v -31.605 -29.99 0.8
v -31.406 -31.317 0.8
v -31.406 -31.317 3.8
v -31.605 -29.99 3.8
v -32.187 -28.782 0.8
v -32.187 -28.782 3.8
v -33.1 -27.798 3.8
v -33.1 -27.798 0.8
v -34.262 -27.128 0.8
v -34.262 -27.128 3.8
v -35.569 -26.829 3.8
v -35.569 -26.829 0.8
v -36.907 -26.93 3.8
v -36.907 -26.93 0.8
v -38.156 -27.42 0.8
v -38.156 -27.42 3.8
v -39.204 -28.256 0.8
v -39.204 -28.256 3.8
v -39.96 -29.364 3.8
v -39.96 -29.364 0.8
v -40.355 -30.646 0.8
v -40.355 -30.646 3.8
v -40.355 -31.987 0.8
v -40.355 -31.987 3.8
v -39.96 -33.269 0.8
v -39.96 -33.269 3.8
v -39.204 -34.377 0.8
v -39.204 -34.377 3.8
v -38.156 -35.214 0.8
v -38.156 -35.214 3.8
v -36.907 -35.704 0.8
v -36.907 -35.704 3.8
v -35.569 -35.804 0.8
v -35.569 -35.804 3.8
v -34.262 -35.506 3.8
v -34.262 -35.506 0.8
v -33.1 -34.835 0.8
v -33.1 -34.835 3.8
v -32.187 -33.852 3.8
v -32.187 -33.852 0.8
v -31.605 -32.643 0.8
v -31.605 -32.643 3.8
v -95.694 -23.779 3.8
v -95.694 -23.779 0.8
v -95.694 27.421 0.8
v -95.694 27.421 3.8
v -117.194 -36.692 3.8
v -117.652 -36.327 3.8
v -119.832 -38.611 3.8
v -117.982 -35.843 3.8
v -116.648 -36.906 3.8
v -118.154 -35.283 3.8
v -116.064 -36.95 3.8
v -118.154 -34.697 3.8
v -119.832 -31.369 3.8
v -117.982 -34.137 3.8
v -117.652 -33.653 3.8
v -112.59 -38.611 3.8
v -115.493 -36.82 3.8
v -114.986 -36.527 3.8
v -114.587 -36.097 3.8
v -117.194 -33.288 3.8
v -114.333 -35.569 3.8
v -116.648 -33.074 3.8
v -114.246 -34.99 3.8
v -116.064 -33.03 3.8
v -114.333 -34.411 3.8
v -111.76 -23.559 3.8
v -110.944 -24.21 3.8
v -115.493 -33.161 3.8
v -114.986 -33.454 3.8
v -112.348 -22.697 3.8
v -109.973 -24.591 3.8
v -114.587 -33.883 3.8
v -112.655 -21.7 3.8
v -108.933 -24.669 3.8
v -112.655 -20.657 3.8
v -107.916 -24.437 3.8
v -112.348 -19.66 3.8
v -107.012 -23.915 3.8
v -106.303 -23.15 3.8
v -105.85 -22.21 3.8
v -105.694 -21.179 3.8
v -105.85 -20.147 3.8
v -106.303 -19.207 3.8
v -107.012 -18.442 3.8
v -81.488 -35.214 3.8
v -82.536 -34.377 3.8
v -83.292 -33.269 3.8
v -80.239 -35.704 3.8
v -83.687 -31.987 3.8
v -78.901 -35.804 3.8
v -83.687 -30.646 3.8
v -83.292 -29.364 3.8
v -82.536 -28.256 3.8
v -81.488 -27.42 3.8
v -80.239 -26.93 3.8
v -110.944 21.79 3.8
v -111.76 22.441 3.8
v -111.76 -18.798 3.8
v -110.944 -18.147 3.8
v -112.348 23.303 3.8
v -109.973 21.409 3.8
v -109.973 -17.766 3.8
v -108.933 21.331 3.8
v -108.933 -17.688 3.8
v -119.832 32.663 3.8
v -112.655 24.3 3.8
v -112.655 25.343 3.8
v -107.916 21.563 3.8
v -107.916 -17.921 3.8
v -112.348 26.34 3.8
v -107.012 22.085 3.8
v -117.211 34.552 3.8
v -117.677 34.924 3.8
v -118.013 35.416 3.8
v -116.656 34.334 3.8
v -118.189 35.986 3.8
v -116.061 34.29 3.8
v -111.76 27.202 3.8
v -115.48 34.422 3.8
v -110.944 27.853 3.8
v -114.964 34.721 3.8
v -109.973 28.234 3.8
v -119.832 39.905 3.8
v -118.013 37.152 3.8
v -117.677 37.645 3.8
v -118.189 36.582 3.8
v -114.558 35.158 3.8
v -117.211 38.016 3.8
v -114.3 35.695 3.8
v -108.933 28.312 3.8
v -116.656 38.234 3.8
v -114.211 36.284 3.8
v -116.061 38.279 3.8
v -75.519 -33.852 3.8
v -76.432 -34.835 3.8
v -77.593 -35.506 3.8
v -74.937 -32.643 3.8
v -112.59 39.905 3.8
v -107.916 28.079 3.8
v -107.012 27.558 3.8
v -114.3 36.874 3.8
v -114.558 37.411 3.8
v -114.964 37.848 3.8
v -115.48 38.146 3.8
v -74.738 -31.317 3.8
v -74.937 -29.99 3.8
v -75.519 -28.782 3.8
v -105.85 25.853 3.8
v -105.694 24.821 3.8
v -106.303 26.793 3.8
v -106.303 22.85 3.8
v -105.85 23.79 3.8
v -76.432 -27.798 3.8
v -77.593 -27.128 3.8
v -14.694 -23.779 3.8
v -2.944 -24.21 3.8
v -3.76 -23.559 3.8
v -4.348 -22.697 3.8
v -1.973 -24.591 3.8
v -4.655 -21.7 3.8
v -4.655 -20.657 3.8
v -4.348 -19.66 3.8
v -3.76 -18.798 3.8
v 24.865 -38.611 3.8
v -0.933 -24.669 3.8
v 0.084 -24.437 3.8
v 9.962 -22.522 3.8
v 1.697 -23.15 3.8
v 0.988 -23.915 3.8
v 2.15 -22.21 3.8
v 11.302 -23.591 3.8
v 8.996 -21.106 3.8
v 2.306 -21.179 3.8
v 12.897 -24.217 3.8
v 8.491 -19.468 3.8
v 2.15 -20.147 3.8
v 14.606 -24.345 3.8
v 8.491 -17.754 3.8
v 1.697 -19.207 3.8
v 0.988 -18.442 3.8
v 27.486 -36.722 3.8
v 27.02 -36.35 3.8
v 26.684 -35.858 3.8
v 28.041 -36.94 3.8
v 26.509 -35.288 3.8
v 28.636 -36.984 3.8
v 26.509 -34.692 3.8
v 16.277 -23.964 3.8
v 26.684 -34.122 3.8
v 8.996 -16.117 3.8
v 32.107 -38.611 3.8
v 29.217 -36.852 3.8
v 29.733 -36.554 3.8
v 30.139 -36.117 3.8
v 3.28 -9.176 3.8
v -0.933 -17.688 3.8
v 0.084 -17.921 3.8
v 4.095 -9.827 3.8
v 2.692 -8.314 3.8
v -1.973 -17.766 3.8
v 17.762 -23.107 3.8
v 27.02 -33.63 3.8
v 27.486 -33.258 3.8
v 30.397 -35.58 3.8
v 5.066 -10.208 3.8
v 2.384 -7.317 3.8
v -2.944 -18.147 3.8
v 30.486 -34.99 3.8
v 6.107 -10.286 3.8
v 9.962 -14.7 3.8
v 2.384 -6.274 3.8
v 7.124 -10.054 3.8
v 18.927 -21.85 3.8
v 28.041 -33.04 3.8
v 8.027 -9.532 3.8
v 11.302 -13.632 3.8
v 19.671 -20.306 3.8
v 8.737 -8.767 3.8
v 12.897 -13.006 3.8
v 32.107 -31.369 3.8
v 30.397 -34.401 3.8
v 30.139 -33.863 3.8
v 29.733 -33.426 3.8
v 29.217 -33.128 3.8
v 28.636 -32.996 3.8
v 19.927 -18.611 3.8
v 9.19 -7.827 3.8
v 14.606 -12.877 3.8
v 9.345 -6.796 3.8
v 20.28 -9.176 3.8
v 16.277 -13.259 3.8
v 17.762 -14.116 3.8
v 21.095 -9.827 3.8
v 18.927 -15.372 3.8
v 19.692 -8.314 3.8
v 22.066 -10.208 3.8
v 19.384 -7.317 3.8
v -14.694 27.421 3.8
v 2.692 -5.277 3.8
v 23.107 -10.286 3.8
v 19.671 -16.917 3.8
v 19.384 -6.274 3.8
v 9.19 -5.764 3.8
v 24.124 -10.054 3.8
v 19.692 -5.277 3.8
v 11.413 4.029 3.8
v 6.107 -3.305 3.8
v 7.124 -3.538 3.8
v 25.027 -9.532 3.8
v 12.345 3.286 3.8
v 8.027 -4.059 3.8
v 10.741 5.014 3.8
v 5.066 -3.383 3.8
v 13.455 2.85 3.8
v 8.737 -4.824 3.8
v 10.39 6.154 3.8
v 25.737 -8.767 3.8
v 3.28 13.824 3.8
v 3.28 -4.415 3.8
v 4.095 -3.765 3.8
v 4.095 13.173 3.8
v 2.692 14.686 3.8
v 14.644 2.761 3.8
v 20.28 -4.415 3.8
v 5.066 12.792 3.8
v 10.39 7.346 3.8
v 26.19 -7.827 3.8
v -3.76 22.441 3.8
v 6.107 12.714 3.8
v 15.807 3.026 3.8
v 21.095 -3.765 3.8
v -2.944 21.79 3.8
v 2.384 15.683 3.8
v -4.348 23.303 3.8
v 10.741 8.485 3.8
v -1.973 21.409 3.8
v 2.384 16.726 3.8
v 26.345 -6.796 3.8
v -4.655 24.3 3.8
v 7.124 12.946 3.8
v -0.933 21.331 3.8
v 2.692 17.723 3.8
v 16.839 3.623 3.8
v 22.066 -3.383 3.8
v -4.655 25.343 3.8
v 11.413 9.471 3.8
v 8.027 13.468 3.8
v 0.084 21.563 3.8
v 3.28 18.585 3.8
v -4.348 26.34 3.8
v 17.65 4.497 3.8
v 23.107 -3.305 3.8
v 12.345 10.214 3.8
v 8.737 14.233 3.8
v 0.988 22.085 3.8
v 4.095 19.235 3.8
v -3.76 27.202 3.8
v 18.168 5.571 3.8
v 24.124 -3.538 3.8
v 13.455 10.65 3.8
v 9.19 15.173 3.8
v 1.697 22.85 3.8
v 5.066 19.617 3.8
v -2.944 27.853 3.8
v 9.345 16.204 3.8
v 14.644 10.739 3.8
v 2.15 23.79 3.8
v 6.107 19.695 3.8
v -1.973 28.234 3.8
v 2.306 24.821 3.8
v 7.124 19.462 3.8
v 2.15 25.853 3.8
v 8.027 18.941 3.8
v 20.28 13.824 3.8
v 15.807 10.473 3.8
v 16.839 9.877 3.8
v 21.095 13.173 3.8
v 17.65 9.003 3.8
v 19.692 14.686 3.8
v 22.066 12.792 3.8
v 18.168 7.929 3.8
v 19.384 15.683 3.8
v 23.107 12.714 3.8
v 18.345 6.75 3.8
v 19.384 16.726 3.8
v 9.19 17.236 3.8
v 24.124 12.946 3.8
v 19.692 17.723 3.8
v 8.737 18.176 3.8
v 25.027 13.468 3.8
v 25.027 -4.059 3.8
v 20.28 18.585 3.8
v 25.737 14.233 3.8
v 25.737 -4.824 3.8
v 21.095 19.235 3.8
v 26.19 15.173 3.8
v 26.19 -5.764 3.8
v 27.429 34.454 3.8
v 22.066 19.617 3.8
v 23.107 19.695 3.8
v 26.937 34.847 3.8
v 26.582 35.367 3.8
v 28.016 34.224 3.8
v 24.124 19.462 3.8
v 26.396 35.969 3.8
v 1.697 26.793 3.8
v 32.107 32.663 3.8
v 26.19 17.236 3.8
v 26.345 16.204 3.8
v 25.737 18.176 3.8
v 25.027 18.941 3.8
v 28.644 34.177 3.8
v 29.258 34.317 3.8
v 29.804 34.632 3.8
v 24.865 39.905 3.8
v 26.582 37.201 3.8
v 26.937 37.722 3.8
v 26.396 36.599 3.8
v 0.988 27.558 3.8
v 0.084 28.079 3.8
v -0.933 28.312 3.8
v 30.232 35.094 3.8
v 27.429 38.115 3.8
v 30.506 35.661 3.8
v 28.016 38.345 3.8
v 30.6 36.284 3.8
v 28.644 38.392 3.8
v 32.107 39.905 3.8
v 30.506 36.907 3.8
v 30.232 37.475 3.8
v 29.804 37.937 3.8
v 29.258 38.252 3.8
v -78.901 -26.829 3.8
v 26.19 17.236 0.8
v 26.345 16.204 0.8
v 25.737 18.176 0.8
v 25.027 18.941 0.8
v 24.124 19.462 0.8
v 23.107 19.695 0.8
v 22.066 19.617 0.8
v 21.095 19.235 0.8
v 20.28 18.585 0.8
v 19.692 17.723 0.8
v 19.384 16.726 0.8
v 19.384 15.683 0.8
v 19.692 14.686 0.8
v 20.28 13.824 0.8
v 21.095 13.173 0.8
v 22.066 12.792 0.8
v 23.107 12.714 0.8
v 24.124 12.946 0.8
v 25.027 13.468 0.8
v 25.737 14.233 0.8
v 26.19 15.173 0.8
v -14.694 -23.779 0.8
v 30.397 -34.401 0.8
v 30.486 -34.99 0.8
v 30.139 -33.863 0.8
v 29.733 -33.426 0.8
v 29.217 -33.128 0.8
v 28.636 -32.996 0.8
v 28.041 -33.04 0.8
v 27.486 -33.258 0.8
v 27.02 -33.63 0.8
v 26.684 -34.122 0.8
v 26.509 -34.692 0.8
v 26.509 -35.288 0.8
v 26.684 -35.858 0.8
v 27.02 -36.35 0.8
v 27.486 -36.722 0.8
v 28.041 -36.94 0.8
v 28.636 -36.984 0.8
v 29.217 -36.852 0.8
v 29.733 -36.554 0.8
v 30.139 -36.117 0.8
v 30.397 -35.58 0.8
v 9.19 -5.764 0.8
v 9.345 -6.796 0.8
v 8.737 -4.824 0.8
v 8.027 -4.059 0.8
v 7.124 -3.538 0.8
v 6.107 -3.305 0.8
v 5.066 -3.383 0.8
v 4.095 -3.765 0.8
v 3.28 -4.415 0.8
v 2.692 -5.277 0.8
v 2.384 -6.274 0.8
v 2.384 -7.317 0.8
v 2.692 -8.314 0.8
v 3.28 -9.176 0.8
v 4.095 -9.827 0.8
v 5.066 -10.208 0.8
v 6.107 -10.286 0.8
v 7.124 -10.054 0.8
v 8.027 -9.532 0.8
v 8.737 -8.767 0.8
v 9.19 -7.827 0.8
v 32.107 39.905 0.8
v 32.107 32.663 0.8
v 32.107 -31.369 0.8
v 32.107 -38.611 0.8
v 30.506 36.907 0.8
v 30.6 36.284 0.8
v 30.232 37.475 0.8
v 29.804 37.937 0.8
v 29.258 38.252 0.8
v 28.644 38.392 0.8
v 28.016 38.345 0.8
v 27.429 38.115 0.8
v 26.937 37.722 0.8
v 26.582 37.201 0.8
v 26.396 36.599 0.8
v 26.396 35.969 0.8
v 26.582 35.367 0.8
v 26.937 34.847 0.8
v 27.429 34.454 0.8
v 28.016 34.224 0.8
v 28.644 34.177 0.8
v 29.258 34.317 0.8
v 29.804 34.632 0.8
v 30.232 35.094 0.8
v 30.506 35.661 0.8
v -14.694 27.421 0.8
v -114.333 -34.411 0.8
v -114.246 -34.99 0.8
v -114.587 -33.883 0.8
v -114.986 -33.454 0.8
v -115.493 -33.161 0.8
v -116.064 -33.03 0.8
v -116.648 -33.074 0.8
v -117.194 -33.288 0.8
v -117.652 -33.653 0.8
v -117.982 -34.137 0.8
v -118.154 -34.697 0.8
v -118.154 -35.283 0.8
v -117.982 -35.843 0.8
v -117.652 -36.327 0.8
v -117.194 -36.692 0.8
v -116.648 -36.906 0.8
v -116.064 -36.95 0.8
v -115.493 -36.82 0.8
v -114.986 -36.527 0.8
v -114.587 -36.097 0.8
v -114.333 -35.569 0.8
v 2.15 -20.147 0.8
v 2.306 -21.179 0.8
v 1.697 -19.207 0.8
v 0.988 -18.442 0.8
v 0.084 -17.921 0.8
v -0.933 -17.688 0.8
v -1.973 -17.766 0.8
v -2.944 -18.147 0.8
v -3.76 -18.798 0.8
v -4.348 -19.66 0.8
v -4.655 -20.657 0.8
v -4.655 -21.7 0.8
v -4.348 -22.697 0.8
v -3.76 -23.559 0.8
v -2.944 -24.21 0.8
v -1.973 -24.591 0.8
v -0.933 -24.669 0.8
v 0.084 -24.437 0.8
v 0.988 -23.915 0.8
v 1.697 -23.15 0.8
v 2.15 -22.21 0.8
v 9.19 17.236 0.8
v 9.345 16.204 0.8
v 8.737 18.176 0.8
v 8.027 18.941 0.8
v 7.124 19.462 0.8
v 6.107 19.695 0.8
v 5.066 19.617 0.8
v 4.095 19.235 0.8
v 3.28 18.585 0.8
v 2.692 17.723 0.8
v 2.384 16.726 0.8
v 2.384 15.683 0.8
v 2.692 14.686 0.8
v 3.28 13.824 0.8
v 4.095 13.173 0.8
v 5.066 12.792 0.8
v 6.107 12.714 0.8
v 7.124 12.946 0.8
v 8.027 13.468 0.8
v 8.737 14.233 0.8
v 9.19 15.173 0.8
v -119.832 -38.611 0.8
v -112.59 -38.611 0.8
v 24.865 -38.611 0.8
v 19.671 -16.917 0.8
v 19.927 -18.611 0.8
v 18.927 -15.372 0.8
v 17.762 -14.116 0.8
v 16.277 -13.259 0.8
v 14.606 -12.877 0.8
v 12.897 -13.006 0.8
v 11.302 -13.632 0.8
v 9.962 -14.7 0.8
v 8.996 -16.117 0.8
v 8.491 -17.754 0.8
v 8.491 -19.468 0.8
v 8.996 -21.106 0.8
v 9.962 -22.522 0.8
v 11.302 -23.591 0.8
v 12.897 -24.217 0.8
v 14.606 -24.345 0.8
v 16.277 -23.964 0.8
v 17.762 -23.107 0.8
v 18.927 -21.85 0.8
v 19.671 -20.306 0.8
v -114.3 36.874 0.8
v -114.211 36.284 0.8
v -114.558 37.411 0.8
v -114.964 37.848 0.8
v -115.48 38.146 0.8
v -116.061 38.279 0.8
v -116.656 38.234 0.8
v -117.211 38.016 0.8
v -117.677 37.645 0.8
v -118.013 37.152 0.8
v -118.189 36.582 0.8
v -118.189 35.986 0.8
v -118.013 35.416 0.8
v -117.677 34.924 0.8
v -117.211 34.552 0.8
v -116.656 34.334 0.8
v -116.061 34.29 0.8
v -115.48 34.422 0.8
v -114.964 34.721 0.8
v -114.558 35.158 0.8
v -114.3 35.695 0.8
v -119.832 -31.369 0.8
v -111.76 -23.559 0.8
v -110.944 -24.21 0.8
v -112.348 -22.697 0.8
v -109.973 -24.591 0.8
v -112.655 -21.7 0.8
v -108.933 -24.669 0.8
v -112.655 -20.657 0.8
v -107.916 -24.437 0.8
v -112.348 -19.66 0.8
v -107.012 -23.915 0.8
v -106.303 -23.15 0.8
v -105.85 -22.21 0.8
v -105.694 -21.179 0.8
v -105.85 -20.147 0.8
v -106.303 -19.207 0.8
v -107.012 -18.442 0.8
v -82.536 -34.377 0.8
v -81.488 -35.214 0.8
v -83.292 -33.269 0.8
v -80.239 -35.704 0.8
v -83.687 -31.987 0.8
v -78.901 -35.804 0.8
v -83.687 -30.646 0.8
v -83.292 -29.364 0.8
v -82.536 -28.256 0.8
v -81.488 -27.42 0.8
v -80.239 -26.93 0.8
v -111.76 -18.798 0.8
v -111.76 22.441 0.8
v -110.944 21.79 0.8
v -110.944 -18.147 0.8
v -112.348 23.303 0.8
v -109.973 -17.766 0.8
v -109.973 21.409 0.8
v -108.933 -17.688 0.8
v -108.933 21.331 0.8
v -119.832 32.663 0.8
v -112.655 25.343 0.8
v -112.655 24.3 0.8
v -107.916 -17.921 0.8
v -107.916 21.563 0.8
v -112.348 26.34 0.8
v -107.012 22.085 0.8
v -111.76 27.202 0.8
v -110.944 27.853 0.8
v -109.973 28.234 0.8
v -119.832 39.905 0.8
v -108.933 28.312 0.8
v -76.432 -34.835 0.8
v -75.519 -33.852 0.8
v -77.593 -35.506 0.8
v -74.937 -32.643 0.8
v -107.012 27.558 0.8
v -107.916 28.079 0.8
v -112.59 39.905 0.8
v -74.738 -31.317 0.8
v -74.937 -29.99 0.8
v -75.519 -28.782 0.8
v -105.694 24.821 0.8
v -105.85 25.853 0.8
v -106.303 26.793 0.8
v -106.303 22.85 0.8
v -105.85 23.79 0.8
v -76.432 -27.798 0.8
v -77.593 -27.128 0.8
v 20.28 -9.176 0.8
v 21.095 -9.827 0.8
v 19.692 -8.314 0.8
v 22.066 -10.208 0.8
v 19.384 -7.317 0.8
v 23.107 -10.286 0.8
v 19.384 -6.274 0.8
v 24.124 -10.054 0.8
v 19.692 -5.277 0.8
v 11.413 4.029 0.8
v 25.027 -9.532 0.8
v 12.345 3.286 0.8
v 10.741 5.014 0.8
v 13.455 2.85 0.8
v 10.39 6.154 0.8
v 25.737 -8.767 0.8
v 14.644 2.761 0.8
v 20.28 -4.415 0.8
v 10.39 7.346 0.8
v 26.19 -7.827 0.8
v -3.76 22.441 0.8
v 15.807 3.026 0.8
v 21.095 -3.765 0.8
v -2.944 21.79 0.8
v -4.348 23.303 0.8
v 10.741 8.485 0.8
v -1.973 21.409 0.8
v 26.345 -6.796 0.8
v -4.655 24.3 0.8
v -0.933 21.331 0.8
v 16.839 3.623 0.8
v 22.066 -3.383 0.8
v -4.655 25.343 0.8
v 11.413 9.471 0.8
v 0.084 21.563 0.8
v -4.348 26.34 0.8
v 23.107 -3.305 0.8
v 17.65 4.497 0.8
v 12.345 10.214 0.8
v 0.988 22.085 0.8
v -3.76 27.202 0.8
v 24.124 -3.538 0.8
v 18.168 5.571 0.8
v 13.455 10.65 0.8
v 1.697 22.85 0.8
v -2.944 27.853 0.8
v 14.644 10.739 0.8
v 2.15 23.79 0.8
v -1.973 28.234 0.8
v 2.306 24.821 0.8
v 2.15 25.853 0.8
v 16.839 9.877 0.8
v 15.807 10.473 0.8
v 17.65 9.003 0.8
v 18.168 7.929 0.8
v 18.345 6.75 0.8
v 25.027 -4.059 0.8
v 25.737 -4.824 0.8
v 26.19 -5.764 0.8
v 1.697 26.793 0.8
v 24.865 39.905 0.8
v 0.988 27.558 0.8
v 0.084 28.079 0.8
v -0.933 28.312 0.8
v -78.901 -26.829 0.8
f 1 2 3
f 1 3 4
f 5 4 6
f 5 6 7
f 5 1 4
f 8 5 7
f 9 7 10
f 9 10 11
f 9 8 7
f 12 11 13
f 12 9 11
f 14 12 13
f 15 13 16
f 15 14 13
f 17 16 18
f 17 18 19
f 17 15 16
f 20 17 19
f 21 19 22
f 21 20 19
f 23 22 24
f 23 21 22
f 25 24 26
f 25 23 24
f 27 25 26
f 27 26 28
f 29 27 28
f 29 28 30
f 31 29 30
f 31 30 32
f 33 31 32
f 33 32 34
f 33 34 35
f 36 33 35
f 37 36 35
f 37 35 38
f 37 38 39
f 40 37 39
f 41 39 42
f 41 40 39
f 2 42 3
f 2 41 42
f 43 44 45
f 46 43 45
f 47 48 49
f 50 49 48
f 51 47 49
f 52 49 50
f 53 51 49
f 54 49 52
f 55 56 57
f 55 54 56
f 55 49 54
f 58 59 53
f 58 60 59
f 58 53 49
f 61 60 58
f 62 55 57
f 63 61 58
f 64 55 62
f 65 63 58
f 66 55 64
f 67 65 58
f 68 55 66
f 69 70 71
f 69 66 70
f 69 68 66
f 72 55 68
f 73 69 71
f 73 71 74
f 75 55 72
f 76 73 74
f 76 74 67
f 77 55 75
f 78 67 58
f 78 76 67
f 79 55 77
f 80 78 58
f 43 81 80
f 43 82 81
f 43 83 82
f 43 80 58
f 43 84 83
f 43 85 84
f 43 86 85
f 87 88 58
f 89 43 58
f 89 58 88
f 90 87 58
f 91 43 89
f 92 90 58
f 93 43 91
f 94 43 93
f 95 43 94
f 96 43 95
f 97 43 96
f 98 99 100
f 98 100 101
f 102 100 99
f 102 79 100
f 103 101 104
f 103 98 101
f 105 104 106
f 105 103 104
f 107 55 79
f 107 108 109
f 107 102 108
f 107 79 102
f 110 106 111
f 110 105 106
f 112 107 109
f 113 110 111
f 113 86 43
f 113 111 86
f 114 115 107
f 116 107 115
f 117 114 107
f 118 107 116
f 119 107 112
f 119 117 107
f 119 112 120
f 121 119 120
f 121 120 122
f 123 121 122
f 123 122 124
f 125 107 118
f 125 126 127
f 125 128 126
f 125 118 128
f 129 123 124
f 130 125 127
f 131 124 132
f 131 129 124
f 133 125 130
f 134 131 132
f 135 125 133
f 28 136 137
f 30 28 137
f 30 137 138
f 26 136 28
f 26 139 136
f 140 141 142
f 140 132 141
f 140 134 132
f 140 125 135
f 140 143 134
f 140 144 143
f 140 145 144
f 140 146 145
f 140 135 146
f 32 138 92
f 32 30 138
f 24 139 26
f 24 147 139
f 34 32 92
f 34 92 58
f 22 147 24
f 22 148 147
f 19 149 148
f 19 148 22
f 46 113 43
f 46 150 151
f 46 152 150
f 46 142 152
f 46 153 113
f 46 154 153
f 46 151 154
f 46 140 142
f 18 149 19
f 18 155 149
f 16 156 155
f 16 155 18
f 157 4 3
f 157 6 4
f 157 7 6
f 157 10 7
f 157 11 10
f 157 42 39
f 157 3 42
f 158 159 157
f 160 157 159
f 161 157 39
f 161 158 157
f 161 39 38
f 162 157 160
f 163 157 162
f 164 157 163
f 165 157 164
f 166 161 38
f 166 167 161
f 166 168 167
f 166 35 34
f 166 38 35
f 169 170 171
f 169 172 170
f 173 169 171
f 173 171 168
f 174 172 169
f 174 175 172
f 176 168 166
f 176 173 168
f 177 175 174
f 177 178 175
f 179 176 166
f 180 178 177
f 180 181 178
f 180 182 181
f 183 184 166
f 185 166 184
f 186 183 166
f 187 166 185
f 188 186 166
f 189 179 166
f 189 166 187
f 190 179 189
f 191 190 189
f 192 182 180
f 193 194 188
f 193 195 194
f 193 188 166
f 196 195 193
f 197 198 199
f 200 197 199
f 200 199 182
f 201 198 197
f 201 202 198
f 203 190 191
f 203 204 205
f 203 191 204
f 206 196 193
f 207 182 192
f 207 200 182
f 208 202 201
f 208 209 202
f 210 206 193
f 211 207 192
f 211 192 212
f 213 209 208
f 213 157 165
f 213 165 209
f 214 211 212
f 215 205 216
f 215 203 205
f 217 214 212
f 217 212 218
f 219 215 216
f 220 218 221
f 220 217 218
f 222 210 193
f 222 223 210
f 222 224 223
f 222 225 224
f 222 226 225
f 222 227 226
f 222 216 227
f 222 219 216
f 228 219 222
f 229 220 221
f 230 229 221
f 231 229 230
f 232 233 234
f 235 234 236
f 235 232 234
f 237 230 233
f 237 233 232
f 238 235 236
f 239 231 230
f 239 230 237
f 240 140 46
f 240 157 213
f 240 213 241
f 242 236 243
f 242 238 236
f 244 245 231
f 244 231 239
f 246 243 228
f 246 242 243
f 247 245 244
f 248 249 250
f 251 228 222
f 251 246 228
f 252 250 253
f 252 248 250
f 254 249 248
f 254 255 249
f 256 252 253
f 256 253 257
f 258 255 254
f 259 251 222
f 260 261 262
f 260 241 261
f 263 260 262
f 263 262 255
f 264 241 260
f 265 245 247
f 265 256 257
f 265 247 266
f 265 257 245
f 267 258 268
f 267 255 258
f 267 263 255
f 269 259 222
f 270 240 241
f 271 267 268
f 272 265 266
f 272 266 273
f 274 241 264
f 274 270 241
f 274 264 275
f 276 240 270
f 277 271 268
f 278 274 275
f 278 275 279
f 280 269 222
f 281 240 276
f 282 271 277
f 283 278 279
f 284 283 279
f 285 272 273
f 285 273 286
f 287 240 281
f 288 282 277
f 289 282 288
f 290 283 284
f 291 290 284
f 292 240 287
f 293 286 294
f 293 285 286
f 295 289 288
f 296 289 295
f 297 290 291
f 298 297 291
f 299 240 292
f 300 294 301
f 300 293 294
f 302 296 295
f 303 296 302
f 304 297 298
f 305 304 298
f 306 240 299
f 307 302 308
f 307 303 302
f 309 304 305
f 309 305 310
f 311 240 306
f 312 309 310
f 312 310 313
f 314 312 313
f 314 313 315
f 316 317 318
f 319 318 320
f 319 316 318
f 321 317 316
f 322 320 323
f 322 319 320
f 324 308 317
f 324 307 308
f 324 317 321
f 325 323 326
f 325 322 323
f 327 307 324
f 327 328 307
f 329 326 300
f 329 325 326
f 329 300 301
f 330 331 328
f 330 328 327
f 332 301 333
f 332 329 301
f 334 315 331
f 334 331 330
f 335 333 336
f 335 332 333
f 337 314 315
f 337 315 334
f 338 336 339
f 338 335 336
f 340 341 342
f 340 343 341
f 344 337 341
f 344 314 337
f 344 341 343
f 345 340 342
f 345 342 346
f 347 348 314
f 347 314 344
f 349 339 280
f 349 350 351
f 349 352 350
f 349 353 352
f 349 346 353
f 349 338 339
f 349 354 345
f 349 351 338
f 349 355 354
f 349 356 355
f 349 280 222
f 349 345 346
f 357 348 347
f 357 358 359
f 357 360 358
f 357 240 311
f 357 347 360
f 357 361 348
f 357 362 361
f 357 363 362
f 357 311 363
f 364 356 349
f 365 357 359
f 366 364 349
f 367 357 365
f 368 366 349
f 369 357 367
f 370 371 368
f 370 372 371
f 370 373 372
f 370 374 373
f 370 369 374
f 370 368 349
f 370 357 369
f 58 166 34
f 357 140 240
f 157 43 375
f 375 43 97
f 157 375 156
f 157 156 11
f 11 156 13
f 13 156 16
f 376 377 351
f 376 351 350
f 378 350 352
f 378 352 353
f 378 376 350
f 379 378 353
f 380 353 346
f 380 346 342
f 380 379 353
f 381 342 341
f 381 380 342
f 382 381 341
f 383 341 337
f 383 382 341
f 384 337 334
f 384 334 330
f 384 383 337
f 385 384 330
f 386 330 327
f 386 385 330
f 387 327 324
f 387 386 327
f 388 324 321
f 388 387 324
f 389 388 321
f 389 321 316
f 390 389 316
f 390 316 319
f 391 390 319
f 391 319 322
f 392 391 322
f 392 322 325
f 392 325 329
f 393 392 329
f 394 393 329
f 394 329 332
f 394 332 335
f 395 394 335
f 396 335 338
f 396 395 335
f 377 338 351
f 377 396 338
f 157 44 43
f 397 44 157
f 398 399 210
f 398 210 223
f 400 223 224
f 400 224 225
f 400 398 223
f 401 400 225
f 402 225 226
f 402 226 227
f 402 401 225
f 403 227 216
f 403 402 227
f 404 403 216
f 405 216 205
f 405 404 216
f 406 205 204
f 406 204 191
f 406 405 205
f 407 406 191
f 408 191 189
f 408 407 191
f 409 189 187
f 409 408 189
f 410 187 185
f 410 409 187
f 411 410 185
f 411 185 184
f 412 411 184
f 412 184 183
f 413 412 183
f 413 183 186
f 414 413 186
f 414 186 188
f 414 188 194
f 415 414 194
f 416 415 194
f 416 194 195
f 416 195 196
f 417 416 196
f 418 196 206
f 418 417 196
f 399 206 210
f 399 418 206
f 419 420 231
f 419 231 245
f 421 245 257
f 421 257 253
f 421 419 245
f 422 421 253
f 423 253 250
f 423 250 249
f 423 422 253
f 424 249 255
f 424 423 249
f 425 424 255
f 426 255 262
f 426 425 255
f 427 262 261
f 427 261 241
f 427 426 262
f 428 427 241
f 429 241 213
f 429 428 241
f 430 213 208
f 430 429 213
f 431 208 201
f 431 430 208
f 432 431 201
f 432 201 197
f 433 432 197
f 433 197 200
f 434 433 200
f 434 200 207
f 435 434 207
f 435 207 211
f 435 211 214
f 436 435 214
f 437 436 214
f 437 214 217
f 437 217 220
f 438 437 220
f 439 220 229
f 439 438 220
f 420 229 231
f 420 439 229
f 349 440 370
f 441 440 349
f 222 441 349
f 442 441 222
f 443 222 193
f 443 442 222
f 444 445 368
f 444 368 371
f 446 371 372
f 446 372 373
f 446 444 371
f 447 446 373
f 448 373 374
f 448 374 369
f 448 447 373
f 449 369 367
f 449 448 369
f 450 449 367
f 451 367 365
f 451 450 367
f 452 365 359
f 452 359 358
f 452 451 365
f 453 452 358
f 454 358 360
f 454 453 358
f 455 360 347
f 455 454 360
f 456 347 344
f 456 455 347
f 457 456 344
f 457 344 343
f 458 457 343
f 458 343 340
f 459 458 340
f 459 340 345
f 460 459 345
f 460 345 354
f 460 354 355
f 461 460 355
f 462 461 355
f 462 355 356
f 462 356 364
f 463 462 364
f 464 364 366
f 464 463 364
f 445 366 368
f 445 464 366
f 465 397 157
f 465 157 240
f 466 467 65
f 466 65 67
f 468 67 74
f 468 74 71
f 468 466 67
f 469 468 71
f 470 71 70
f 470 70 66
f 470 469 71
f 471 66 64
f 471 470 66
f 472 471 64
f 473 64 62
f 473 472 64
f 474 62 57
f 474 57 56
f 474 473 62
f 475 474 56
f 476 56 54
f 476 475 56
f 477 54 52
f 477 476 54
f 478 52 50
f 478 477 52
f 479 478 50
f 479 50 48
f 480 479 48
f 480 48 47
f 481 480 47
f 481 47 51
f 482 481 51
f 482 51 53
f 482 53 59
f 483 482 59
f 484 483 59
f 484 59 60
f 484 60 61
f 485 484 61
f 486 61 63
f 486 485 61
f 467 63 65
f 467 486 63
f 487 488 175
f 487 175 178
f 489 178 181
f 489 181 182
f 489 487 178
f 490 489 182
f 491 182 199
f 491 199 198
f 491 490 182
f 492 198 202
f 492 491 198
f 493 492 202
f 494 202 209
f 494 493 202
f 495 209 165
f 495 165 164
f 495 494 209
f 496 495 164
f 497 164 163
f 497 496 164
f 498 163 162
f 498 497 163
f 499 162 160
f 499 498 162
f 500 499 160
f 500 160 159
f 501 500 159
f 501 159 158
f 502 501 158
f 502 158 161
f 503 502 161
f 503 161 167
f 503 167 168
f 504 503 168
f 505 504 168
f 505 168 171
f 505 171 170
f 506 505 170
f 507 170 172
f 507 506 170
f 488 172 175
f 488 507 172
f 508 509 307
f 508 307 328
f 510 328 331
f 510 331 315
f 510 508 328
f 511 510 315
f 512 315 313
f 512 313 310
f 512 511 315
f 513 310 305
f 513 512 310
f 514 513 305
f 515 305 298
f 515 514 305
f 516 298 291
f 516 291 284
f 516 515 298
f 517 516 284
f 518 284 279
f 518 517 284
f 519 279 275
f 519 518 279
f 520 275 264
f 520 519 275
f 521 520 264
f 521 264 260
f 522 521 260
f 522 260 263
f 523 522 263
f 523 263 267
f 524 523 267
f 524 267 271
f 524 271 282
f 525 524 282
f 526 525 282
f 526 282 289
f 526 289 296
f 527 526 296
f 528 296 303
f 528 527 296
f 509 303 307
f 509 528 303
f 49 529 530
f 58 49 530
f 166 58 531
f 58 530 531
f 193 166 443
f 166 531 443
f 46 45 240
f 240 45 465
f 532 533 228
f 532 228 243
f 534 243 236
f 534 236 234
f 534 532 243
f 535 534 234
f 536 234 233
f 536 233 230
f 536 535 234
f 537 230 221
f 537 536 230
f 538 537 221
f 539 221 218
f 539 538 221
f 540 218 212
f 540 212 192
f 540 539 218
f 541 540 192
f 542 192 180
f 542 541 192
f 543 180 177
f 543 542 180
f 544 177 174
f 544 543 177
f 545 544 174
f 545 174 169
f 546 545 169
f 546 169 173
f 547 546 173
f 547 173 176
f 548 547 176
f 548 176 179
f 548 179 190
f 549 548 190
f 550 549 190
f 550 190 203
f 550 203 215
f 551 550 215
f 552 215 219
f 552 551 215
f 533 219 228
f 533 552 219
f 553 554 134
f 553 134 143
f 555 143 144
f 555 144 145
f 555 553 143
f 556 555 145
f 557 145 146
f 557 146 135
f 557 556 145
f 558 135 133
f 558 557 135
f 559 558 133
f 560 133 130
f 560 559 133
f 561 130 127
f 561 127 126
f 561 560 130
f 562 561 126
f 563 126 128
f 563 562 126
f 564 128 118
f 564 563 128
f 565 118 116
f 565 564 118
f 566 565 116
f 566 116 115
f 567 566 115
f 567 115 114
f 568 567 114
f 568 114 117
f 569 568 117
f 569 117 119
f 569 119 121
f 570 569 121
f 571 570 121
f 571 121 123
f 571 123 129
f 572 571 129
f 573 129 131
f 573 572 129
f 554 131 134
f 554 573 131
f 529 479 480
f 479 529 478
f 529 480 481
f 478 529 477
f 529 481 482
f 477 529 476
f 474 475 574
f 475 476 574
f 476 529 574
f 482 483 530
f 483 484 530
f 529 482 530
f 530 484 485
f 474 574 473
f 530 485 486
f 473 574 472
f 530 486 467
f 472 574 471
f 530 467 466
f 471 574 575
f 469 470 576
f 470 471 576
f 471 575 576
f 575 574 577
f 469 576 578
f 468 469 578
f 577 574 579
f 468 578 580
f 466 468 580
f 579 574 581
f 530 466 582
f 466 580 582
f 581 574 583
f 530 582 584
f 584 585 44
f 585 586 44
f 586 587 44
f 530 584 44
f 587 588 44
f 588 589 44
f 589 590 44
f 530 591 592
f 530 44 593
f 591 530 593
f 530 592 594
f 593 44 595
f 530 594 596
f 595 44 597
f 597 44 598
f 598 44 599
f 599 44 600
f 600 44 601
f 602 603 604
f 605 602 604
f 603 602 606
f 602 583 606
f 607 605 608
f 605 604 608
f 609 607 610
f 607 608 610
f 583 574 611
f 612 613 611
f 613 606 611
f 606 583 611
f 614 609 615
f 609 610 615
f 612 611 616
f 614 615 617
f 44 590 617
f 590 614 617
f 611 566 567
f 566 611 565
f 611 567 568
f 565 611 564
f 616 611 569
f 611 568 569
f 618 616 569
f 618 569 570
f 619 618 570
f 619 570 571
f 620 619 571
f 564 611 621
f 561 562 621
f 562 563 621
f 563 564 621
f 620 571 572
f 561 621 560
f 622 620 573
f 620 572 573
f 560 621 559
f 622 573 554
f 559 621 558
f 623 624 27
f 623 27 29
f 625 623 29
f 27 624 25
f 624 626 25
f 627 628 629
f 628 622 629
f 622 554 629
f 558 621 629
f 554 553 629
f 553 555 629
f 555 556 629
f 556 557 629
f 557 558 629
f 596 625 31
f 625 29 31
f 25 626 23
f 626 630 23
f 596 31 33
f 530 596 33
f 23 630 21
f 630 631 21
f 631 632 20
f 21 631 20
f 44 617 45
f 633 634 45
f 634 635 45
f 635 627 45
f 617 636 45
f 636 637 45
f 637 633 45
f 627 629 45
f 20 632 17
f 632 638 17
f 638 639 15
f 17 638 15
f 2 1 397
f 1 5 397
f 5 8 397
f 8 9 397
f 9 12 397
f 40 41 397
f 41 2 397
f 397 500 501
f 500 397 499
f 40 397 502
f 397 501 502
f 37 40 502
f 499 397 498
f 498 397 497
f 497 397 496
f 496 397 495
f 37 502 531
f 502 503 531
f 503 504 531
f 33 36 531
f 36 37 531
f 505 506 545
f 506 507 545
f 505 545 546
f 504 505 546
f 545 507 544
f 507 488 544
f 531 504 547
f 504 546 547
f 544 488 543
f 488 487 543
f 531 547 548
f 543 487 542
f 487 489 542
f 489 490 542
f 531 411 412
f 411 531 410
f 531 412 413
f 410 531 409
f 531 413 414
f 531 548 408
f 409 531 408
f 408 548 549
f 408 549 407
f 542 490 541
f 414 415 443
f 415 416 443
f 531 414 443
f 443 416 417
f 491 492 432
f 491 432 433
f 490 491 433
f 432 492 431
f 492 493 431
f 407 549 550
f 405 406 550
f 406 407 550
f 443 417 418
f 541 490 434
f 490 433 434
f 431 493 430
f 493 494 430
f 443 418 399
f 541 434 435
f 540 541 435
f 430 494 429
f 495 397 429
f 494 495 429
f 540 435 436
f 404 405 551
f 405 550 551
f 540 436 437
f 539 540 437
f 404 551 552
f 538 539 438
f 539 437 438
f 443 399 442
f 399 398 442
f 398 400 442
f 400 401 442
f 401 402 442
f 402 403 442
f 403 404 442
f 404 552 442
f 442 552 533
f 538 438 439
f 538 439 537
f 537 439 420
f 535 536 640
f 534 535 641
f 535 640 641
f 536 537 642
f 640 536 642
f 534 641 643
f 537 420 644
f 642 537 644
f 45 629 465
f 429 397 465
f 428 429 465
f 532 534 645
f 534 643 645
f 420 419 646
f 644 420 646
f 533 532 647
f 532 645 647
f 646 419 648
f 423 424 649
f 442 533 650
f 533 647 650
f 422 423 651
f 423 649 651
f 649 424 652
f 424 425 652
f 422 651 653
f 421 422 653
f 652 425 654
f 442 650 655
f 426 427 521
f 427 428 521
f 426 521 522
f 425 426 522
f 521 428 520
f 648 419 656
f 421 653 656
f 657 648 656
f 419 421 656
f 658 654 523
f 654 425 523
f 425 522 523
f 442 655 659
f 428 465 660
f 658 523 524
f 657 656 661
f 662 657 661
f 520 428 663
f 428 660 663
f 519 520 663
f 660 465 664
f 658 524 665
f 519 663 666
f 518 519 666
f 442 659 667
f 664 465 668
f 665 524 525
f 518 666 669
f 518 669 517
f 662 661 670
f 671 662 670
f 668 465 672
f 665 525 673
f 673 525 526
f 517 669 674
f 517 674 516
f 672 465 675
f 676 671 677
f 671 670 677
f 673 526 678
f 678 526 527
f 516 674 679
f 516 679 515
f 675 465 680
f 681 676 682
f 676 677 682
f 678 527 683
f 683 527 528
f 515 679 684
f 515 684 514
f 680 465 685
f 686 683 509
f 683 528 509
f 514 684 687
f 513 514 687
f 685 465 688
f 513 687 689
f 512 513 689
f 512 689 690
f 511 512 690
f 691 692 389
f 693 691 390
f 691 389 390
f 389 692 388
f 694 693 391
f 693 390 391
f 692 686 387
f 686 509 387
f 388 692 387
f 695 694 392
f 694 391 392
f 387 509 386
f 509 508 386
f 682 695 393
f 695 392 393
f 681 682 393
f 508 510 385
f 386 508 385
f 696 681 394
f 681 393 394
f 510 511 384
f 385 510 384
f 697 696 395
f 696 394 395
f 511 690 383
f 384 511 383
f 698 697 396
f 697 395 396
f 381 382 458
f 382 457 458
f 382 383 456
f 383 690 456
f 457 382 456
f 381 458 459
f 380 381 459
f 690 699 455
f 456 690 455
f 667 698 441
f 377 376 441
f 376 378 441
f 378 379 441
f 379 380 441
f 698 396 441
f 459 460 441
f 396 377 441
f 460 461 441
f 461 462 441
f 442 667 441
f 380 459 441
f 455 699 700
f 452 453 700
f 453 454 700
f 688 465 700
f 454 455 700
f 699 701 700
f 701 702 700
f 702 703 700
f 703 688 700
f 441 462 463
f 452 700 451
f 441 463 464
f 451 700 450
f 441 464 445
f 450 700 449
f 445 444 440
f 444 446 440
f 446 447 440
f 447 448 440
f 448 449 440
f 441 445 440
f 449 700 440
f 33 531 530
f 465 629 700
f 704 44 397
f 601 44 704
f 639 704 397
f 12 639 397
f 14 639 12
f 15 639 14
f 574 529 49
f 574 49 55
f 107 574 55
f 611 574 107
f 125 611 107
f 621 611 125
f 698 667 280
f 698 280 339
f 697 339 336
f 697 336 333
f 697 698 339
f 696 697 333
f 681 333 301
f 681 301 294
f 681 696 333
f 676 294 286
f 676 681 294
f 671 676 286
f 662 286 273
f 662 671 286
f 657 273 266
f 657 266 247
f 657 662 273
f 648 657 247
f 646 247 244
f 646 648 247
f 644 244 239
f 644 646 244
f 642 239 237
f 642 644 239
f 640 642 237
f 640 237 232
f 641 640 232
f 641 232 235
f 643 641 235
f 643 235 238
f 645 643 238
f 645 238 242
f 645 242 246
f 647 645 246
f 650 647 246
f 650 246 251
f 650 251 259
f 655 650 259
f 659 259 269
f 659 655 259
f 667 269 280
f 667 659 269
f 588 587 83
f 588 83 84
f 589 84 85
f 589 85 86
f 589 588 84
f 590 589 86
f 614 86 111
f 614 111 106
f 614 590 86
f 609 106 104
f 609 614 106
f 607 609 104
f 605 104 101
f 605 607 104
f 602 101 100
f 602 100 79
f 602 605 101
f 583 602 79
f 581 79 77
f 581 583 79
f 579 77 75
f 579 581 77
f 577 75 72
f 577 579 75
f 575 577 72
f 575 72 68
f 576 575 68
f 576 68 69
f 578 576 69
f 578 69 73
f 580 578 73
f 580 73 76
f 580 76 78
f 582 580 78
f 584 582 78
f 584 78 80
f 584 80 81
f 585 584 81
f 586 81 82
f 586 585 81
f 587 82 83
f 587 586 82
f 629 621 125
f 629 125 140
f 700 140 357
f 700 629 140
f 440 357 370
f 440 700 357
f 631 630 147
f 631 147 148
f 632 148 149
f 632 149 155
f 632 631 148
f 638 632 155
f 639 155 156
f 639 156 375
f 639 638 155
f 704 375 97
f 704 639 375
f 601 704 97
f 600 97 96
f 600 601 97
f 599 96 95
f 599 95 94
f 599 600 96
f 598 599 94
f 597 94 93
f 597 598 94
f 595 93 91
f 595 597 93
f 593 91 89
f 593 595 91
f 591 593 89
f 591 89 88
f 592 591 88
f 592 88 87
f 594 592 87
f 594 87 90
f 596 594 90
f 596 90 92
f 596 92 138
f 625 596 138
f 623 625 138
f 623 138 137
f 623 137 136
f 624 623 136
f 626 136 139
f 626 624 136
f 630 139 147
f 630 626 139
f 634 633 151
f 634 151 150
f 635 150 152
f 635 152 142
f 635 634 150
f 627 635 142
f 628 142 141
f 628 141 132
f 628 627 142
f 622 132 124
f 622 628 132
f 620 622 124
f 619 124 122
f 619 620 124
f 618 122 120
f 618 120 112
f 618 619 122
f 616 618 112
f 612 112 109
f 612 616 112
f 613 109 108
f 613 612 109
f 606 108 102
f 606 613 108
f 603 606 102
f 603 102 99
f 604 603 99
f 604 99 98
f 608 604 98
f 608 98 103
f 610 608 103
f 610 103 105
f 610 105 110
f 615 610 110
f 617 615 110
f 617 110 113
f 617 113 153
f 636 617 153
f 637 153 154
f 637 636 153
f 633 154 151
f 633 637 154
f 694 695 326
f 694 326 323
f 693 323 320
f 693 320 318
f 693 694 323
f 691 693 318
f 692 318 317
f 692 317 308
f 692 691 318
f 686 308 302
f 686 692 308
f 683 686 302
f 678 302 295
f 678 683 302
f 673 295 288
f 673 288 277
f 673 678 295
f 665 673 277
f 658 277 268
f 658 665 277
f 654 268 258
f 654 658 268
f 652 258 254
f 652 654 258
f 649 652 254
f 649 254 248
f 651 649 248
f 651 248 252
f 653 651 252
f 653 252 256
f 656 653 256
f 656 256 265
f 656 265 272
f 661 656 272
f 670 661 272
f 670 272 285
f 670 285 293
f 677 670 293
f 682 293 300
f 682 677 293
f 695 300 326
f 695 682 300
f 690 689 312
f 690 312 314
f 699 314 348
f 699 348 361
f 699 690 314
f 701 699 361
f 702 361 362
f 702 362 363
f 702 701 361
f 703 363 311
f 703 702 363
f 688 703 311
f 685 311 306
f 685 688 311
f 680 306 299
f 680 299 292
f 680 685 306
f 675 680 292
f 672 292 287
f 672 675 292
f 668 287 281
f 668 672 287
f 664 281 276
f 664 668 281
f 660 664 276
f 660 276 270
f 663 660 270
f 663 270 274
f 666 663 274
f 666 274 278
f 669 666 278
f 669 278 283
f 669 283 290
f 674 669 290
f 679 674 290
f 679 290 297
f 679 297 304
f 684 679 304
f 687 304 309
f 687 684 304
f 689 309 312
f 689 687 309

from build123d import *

# Parameters (mm, degrees)
ESQUISSE1_R        = 3.5
ESQUISSE1_R_2      = 4
ESQUISSE1_R_3      = 5.75
ESQUISSE1_R_4      = 4.5
ESQUISSE1_W        = 81
ESQUISSE1_H        = 51.2
BOSS_EXTRU_1_DEPTH = 3
ESQUISSE2_W        = 7.242640687
ESQUISSE2_H        = 7.242640687
ESQUISSE2_R        = 1.965304202
ESQUISSE2_R_2      = 2
ESQUISSE2_R_3      = 2.113486369
BOSS_EXTRU_2_DEPTH = 3


with BuildPart() as part:
    # Esquisse1 → Boss.-Extru.1 (new body)
    with BuildSketch(Plane.XY.offset(0.8)):
        with BuildLine():
            Line((-112.589634865, 39.905491149), (24.864852981, 39.905491149))
            Line((24.864852981, 39.905491149), (24.864852981, 35.662850462))
            ThreePointArc((24.864852981, 35.662850462), (25.743532637, 33.541530119), (27.864852981, 32.662850462))
            Line((27.864852981, 32.662850462), (32.107493668, 32.662850462))
            Line((32.107493668, 32.662850462), (32.107493668, -31.368742114))
            Line((32.107493668, -31.368742114), (27.864852981, -31.368742114))
            ThreePointArc((27.864852981, -31.368742114), (25.743532637, -32.24742177), (24.864852981, -34.368742114))
            Line((24.864852981, -34.368742114), (24.864852981, -38.611382801))
            Line((24.864852981, -38.611382801), (-112.589634865, -38.611382801))
            Line((-112.589634865, -38.611382801), (-112.589634865, -34.368742114))
            ThreePointArc((-112.589634865, -34.368742114), (-113.468314521, -32.24742177), (-115.589634865, -31.368742114))
            Line((-115.589634865, -31.368742114), (-119.832275552, -31.368742114))
            Line((-119.832275552, -31.368742114), (-119.832275552, 32.662850462))
            Line((-119.832275552, 32.662850462), (-115.589634865, 32.662850462))
            ThreePointArc((-115.589634865, 32.662850462), (-113.468314521, 33.541530119), (-112.589634865, 35.662850462))
            Line((-112.589634865, 35.662850462), (-112.589634865, 39.905491149))
        make_face()
        with Locations((-109.194417438, 24.821428571)):
            Circle(ESQUISSE1_R, mode=Mode.SUBTRACT)
        with Locations((-1.194417438, 24.821428571)):
            Circle(ESQUISSE1_R, mode=Mode.SUBTRACT)
        with Locations((-1.194417438, -21.178571429)):
            Circle(ESQUISSE1_R, mode=Mode.SUBTRACT)
        with Locations((-109.194417438, -21.178571429)):
            Circle(ESQUISSE1_R, mode=Mode.SUBTRACT)
        with Locations((14.345224597, 6.749852674)):
            Circle(ESQUISSE1_R_2, mode=Mode.SUBTRACT)
        with Locations((5.845224597, 16.204342535)):
            Circle(ESQUISSE1_R, mode=Mode.SUBTRACT)
        with Locations((22.845224597, 16.204342535)):
            Circle(ESQUISSE1_R, mode=Mode.SUBTRACT)
        with Locations((22.845224597, -6.795657465)):
            Circle(ESQUISSE1_R, mode=Mode.SUBTRACT)
        with Locations((5.845224597, -6.795657465)):
            Circle(ESQUISSE1_R, mode=Mode.SUBTRACT)
        with Locations((14.176552179, -18.611382801)):
            Circle(ESQUISSE1_R_3, mode=Mode.SUBTRACT)
        with Locations((-35.905557573, -31.316718293)):
            Circle(ESQUISSE1_R_4, mode=Mode.SUBTRACT)
        with Locations((-79.237508709, -31.316718293)):
            Circle(ESQUISSE1_R_4, mode=Mode.SUBTRACT)
        with Locations((-55.194417438, 1.821428571)):
            Rectangle(ESQUISSE1_W, ESQUISSE1_H, mode=Mode.SUBTRACT)
    extrude(amount=BOSS_EXTRU_1_DEPTH)

    # Esquisse2 → Boss.-Extru.2 (add)
    # profile 1 of 4: a face of its own
    with BuildSketch(Plane.XY.offset(0.8)):
        with Locations((-116.210955209, -34.990062458)):
            Rectangle(ESQUISSE2_W, ESQUISSE2_H)
        with Locations((-116.210955208, -34.990062458)):
            Circle(ESQUISSE2_R, mode=Mode.SUBTRACT)
    # profile 2 of 4: a face of its own
    with BuildSketch(Plane.XY.offset(0.8)):
        with Locations((-116.210955209, 36.284170805)):
            Rectangle(ESQUISSE2_W, ESQUISSE2_H)
        with Locations((-116.210955208, 36.284170806)):
            Circle(ESQUISSE2_R_2, mode=Mode.SUBTRACT)
    # profile 3 of 4: a face of its own
    with BuildSketch(Plane.XY.offset(0.8)):
        with Locations((28.486173325, 36.284170805)):
            Rectangle(ESQUISSE2_W, ESQUISSE2_H)
        with Locations((28.486173324, 36.284170806)):
            Circle(ESQUISSE2_R_3, mode=Mode.SUBTRACT)
    # profile 4 of 4: a face of its own
    with BuildSketch(Plane.XY.offset(0.8)):
        with Locations((28.486173325, -34.990062458)):
            Rectangle(ESQUISSE2_W, ESQUISSE2_H)
        with Locations((28.486173324, -34.990062458)):
            Circle(ESQUISSE2_R_2, mode=Mode.SUBTRACT)
    extrude(amount=BOSS_EXTRU_2_DEPTH)


solid = part.part
